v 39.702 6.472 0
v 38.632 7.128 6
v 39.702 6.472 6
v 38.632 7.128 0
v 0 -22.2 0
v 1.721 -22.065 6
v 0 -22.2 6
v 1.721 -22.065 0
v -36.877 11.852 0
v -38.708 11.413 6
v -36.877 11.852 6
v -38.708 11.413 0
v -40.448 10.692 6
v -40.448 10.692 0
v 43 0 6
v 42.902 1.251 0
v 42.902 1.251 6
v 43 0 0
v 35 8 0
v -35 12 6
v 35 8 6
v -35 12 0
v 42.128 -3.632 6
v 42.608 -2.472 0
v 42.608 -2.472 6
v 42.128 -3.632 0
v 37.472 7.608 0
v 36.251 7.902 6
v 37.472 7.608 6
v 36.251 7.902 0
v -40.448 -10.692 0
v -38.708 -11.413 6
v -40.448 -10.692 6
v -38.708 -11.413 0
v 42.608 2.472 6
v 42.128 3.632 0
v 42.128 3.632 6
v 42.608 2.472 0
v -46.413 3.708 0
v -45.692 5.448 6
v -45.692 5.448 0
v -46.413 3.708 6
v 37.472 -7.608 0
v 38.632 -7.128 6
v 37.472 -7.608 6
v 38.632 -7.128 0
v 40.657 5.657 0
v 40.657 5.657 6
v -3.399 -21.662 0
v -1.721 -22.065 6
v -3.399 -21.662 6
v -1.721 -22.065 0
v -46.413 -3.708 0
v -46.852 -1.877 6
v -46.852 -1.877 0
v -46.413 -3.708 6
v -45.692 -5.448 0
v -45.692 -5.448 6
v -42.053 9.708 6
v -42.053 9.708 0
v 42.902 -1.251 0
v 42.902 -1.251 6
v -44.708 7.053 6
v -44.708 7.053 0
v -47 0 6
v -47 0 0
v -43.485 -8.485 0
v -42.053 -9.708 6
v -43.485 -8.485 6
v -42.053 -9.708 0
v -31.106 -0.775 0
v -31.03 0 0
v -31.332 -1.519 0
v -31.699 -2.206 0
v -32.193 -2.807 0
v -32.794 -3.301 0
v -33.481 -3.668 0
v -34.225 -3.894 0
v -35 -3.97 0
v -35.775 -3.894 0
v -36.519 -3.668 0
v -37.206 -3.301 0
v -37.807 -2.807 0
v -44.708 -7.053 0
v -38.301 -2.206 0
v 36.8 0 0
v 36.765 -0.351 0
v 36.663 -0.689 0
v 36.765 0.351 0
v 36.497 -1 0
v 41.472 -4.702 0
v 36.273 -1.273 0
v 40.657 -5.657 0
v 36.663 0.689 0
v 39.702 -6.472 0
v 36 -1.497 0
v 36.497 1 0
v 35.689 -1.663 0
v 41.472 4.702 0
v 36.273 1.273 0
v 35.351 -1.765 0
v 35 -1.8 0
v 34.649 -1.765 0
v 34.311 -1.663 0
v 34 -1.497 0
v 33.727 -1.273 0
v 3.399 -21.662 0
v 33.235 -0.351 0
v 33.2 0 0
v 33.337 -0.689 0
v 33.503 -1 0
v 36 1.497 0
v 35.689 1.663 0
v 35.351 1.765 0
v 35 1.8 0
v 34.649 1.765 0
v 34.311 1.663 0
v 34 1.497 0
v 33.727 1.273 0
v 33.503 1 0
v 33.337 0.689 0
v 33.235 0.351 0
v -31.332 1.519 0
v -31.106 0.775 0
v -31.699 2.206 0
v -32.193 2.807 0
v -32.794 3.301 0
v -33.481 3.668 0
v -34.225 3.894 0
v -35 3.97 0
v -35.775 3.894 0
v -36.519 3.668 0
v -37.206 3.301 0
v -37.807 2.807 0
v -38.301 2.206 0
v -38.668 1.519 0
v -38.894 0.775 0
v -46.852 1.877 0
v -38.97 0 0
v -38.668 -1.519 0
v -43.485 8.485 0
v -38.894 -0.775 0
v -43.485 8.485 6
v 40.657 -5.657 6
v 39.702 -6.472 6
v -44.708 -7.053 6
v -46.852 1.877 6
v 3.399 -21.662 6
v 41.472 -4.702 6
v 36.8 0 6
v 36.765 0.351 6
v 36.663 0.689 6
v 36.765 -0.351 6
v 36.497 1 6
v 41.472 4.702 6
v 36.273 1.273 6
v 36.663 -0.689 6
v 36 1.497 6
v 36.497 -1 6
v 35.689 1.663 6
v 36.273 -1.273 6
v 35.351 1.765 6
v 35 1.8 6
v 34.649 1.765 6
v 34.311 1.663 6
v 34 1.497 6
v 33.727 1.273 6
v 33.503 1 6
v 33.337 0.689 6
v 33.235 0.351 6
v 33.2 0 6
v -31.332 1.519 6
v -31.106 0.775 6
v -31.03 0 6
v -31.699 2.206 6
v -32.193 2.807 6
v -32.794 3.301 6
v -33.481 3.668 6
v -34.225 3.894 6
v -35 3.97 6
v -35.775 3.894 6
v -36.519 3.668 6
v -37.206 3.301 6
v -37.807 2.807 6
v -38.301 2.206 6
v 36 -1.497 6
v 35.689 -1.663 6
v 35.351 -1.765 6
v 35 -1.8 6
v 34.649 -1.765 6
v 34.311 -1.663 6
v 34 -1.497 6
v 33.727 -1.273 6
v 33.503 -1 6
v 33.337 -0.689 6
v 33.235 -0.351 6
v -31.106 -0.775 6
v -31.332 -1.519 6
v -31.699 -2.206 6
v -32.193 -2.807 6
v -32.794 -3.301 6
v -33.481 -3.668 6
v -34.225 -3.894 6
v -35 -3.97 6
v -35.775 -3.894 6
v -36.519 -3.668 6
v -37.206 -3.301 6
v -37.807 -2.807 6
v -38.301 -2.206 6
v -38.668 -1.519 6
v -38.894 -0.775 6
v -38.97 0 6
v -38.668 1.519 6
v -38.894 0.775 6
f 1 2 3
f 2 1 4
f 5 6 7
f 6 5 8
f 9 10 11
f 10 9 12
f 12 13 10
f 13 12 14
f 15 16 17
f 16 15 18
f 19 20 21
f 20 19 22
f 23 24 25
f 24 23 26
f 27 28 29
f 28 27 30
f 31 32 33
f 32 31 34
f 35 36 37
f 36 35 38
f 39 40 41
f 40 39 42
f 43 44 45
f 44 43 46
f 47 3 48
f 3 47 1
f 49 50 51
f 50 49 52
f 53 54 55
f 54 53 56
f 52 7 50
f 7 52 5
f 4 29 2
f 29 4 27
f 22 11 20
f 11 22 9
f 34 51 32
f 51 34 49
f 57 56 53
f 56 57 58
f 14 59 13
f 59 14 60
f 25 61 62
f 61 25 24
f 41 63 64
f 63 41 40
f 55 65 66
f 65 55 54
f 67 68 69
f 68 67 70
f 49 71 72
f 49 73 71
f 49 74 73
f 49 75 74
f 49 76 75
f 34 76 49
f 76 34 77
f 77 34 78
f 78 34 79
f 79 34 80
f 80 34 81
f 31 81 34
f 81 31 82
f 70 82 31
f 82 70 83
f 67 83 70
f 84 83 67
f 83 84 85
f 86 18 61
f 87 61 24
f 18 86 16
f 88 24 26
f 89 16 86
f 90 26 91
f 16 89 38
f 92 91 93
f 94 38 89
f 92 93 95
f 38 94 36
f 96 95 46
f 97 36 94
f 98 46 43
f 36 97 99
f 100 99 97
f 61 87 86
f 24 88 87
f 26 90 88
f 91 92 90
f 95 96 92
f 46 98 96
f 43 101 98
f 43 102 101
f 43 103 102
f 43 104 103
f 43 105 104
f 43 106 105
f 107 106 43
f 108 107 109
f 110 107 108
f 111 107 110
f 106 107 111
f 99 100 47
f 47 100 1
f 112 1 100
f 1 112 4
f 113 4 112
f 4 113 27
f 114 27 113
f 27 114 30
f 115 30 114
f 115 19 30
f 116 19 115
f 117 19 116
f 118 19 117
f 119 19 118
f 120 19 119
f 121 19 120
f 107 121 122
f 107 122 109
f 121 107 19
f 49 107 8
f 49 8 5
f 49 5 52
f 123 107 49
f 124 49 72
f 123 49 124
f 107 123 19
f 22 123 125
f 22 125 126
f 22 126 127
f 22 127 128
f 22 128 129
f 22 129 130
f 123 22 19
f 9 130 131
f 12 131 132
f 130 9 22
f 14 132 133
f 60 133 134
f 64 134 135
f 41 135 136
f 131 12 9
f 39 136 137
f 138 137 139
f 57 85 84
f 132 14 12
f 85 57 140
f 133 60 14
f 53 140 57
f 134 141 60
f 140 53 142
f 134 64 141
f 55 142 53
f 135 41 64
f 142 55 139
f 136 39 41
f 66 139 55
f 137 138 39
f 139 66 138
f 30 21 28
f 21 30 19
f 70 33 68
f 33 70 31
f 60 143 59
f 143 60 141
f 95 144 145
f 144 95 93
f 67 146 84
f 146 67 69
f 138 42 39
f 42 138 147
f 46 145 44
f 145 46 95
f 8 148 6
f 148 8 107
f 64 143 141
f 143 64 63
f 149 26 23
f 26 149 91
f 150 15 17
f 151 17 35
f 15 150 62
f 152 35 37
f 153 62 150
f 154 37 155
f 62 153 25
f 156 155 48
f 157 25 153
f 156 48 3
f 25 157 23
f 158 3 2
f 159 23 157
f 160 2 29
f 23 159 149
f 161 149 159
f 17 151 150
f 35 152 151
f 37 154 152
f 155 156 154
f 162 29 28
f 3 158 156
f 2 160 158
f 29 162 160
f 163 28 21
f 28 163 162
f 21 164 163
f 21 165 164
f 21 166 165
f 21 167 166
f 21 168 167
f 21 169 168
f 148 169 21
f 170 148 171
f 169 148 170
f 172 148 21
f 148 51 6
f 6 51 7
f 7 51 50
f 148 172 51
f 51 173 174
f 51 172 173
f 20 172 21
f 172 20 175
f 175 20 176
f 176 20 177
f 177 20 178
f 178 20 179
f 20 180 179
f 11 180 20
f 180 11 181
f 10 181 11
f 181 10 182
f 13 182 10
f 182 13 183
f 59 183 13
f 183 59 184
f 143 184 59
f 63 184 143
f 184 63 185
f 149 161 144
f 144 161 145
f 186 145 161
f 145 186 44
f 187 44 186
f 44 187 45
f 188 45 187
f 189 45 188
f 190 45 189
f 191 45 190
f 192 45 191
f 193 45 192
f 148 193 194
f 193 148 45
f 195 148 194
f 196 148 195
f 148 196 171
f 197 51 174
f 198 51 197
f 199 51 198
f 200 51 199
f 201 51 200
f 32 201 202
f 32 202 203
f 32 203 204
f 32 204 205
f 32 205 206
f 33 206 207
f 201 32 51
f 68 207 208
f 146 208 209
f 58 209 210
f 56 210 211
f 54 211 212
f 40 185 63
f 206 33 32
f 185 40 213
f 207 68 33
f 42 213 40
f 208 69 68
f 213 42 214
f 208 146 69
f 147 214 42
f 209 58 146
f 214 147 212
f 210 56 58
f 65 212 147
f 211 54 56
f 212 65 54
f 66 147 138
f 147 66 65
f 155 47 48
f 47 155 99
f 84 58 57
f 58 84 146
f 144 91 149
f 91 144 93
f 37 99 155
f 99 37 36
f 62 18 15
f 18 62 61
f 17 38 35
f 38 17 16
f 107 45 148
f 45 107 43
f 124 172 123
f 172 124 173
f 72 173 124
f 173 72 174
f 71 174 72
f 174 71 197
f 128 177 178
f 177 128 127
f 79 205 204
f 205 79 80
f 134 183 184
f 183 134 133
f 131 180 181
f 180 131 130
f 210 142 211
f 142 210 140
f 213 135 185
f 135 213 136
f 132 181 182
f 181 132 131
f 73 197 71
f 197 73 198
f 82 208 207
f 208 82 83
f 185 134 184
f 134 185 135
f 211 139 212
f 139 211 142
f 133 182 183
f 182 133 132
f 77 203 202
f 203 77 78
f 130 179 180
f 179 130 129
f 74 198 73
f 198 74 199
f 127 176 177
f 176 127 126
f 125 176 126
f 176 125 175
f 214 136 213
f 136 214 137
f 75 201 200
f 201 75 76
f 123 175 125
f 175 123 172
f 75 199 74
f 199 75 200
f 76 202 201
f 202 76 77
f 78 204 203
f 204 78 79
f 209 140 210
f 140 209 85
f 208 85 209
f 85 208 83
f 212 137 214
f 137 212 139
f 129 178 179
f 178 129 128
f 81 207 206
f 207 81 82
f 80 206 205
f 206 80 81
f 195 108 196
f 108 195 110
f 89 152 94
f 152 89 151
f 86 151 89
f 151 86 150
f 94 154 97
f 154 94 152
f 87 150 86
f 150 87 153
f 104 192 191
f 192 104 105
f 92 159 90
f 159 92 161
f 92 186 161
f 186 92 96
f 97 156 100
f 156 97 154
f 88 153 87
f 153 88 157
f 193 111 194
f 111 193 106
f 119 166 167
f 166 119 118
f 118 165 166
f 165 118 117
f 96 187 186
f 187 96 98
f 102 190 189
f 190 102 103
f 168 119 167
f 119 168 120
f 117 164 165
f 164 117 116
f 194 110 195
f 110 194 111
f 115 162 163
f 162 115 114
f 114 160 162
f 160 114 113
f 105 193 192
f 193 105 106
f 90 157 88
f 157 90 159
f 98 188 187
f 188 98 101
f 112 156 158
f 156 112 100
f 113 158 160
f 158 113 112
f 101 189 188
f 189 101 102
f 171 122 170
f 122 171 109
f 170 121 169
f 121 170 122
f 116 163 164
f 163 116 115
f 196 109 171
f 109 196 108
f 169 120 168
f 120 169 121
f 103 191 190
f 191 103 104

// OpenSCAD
$fn = 32;

// ----------------------------------------------------------------------
// Lever: 70 mm between the bosses, 6 mm thick, smooth outline
// ----------------------------------------------------------------------

// --- parameters (mm) ---
lever_l = 70;             // distance between the boss centres
boss_a = 24;              // first boss diameter
boss_b = 16;              // second boss diameter
bore_a = 7.94;            // first bore
bore_b = 3.6;             // second bore
lever_t = 6;              // lever thickness
boss_c = 22;              // middle boss diameter
bend = 11.2;              // how far the middle boss drops

lever_profile = [[-47, 0], [-46.852, -1.877], [-46.413, -3.708], [-45.692, -5.448], [-44.708, -7.053], [-43.485, -8.485], [-42.053, -9.708], [-40.448, -10.692], [-38.708, -11.413], [-3.399, -21.662], [-1.721, -22.065], [0, -22.2], [1.721, -22.065], [3.399, -21.662], [37.472, -7.608], [38.632, -7.128], [39.702, -6.472], [40.657, -5.657], [41.472, -4.702], [42.128, -3.632], [42.608, -2.472], [42.902, -1.251], [43, 0], [42.902, 1.251], [42.608, 2.472], [42.128, 3.632], [41.472, 4.702], [40.657, 5.657], [39.702, 6.472], [38.632, 7.128], [37.472, 7.608], [36.251, 7.902], [35, 8], [-35, 12], [-36.877, 11.852], [-38.708, 11.413], [-40.448, 10.692], [-42.053, 9.708], [-43.485, 8.485], [-44.708, 7.053], [-45.692, 5.448], [-46.413, 3.708], [-46.852, 1.877]];

difference() {
  linear_extrude(height = lever_t) polygon(lever_profile);
  translate([-35, 0, -2.5]) cylinder(h = lever_t + 5, d = bore_a);
  translate([35, 0, -2.5]) cylinder(h = lever_t + 5, d = bore_b);
}
